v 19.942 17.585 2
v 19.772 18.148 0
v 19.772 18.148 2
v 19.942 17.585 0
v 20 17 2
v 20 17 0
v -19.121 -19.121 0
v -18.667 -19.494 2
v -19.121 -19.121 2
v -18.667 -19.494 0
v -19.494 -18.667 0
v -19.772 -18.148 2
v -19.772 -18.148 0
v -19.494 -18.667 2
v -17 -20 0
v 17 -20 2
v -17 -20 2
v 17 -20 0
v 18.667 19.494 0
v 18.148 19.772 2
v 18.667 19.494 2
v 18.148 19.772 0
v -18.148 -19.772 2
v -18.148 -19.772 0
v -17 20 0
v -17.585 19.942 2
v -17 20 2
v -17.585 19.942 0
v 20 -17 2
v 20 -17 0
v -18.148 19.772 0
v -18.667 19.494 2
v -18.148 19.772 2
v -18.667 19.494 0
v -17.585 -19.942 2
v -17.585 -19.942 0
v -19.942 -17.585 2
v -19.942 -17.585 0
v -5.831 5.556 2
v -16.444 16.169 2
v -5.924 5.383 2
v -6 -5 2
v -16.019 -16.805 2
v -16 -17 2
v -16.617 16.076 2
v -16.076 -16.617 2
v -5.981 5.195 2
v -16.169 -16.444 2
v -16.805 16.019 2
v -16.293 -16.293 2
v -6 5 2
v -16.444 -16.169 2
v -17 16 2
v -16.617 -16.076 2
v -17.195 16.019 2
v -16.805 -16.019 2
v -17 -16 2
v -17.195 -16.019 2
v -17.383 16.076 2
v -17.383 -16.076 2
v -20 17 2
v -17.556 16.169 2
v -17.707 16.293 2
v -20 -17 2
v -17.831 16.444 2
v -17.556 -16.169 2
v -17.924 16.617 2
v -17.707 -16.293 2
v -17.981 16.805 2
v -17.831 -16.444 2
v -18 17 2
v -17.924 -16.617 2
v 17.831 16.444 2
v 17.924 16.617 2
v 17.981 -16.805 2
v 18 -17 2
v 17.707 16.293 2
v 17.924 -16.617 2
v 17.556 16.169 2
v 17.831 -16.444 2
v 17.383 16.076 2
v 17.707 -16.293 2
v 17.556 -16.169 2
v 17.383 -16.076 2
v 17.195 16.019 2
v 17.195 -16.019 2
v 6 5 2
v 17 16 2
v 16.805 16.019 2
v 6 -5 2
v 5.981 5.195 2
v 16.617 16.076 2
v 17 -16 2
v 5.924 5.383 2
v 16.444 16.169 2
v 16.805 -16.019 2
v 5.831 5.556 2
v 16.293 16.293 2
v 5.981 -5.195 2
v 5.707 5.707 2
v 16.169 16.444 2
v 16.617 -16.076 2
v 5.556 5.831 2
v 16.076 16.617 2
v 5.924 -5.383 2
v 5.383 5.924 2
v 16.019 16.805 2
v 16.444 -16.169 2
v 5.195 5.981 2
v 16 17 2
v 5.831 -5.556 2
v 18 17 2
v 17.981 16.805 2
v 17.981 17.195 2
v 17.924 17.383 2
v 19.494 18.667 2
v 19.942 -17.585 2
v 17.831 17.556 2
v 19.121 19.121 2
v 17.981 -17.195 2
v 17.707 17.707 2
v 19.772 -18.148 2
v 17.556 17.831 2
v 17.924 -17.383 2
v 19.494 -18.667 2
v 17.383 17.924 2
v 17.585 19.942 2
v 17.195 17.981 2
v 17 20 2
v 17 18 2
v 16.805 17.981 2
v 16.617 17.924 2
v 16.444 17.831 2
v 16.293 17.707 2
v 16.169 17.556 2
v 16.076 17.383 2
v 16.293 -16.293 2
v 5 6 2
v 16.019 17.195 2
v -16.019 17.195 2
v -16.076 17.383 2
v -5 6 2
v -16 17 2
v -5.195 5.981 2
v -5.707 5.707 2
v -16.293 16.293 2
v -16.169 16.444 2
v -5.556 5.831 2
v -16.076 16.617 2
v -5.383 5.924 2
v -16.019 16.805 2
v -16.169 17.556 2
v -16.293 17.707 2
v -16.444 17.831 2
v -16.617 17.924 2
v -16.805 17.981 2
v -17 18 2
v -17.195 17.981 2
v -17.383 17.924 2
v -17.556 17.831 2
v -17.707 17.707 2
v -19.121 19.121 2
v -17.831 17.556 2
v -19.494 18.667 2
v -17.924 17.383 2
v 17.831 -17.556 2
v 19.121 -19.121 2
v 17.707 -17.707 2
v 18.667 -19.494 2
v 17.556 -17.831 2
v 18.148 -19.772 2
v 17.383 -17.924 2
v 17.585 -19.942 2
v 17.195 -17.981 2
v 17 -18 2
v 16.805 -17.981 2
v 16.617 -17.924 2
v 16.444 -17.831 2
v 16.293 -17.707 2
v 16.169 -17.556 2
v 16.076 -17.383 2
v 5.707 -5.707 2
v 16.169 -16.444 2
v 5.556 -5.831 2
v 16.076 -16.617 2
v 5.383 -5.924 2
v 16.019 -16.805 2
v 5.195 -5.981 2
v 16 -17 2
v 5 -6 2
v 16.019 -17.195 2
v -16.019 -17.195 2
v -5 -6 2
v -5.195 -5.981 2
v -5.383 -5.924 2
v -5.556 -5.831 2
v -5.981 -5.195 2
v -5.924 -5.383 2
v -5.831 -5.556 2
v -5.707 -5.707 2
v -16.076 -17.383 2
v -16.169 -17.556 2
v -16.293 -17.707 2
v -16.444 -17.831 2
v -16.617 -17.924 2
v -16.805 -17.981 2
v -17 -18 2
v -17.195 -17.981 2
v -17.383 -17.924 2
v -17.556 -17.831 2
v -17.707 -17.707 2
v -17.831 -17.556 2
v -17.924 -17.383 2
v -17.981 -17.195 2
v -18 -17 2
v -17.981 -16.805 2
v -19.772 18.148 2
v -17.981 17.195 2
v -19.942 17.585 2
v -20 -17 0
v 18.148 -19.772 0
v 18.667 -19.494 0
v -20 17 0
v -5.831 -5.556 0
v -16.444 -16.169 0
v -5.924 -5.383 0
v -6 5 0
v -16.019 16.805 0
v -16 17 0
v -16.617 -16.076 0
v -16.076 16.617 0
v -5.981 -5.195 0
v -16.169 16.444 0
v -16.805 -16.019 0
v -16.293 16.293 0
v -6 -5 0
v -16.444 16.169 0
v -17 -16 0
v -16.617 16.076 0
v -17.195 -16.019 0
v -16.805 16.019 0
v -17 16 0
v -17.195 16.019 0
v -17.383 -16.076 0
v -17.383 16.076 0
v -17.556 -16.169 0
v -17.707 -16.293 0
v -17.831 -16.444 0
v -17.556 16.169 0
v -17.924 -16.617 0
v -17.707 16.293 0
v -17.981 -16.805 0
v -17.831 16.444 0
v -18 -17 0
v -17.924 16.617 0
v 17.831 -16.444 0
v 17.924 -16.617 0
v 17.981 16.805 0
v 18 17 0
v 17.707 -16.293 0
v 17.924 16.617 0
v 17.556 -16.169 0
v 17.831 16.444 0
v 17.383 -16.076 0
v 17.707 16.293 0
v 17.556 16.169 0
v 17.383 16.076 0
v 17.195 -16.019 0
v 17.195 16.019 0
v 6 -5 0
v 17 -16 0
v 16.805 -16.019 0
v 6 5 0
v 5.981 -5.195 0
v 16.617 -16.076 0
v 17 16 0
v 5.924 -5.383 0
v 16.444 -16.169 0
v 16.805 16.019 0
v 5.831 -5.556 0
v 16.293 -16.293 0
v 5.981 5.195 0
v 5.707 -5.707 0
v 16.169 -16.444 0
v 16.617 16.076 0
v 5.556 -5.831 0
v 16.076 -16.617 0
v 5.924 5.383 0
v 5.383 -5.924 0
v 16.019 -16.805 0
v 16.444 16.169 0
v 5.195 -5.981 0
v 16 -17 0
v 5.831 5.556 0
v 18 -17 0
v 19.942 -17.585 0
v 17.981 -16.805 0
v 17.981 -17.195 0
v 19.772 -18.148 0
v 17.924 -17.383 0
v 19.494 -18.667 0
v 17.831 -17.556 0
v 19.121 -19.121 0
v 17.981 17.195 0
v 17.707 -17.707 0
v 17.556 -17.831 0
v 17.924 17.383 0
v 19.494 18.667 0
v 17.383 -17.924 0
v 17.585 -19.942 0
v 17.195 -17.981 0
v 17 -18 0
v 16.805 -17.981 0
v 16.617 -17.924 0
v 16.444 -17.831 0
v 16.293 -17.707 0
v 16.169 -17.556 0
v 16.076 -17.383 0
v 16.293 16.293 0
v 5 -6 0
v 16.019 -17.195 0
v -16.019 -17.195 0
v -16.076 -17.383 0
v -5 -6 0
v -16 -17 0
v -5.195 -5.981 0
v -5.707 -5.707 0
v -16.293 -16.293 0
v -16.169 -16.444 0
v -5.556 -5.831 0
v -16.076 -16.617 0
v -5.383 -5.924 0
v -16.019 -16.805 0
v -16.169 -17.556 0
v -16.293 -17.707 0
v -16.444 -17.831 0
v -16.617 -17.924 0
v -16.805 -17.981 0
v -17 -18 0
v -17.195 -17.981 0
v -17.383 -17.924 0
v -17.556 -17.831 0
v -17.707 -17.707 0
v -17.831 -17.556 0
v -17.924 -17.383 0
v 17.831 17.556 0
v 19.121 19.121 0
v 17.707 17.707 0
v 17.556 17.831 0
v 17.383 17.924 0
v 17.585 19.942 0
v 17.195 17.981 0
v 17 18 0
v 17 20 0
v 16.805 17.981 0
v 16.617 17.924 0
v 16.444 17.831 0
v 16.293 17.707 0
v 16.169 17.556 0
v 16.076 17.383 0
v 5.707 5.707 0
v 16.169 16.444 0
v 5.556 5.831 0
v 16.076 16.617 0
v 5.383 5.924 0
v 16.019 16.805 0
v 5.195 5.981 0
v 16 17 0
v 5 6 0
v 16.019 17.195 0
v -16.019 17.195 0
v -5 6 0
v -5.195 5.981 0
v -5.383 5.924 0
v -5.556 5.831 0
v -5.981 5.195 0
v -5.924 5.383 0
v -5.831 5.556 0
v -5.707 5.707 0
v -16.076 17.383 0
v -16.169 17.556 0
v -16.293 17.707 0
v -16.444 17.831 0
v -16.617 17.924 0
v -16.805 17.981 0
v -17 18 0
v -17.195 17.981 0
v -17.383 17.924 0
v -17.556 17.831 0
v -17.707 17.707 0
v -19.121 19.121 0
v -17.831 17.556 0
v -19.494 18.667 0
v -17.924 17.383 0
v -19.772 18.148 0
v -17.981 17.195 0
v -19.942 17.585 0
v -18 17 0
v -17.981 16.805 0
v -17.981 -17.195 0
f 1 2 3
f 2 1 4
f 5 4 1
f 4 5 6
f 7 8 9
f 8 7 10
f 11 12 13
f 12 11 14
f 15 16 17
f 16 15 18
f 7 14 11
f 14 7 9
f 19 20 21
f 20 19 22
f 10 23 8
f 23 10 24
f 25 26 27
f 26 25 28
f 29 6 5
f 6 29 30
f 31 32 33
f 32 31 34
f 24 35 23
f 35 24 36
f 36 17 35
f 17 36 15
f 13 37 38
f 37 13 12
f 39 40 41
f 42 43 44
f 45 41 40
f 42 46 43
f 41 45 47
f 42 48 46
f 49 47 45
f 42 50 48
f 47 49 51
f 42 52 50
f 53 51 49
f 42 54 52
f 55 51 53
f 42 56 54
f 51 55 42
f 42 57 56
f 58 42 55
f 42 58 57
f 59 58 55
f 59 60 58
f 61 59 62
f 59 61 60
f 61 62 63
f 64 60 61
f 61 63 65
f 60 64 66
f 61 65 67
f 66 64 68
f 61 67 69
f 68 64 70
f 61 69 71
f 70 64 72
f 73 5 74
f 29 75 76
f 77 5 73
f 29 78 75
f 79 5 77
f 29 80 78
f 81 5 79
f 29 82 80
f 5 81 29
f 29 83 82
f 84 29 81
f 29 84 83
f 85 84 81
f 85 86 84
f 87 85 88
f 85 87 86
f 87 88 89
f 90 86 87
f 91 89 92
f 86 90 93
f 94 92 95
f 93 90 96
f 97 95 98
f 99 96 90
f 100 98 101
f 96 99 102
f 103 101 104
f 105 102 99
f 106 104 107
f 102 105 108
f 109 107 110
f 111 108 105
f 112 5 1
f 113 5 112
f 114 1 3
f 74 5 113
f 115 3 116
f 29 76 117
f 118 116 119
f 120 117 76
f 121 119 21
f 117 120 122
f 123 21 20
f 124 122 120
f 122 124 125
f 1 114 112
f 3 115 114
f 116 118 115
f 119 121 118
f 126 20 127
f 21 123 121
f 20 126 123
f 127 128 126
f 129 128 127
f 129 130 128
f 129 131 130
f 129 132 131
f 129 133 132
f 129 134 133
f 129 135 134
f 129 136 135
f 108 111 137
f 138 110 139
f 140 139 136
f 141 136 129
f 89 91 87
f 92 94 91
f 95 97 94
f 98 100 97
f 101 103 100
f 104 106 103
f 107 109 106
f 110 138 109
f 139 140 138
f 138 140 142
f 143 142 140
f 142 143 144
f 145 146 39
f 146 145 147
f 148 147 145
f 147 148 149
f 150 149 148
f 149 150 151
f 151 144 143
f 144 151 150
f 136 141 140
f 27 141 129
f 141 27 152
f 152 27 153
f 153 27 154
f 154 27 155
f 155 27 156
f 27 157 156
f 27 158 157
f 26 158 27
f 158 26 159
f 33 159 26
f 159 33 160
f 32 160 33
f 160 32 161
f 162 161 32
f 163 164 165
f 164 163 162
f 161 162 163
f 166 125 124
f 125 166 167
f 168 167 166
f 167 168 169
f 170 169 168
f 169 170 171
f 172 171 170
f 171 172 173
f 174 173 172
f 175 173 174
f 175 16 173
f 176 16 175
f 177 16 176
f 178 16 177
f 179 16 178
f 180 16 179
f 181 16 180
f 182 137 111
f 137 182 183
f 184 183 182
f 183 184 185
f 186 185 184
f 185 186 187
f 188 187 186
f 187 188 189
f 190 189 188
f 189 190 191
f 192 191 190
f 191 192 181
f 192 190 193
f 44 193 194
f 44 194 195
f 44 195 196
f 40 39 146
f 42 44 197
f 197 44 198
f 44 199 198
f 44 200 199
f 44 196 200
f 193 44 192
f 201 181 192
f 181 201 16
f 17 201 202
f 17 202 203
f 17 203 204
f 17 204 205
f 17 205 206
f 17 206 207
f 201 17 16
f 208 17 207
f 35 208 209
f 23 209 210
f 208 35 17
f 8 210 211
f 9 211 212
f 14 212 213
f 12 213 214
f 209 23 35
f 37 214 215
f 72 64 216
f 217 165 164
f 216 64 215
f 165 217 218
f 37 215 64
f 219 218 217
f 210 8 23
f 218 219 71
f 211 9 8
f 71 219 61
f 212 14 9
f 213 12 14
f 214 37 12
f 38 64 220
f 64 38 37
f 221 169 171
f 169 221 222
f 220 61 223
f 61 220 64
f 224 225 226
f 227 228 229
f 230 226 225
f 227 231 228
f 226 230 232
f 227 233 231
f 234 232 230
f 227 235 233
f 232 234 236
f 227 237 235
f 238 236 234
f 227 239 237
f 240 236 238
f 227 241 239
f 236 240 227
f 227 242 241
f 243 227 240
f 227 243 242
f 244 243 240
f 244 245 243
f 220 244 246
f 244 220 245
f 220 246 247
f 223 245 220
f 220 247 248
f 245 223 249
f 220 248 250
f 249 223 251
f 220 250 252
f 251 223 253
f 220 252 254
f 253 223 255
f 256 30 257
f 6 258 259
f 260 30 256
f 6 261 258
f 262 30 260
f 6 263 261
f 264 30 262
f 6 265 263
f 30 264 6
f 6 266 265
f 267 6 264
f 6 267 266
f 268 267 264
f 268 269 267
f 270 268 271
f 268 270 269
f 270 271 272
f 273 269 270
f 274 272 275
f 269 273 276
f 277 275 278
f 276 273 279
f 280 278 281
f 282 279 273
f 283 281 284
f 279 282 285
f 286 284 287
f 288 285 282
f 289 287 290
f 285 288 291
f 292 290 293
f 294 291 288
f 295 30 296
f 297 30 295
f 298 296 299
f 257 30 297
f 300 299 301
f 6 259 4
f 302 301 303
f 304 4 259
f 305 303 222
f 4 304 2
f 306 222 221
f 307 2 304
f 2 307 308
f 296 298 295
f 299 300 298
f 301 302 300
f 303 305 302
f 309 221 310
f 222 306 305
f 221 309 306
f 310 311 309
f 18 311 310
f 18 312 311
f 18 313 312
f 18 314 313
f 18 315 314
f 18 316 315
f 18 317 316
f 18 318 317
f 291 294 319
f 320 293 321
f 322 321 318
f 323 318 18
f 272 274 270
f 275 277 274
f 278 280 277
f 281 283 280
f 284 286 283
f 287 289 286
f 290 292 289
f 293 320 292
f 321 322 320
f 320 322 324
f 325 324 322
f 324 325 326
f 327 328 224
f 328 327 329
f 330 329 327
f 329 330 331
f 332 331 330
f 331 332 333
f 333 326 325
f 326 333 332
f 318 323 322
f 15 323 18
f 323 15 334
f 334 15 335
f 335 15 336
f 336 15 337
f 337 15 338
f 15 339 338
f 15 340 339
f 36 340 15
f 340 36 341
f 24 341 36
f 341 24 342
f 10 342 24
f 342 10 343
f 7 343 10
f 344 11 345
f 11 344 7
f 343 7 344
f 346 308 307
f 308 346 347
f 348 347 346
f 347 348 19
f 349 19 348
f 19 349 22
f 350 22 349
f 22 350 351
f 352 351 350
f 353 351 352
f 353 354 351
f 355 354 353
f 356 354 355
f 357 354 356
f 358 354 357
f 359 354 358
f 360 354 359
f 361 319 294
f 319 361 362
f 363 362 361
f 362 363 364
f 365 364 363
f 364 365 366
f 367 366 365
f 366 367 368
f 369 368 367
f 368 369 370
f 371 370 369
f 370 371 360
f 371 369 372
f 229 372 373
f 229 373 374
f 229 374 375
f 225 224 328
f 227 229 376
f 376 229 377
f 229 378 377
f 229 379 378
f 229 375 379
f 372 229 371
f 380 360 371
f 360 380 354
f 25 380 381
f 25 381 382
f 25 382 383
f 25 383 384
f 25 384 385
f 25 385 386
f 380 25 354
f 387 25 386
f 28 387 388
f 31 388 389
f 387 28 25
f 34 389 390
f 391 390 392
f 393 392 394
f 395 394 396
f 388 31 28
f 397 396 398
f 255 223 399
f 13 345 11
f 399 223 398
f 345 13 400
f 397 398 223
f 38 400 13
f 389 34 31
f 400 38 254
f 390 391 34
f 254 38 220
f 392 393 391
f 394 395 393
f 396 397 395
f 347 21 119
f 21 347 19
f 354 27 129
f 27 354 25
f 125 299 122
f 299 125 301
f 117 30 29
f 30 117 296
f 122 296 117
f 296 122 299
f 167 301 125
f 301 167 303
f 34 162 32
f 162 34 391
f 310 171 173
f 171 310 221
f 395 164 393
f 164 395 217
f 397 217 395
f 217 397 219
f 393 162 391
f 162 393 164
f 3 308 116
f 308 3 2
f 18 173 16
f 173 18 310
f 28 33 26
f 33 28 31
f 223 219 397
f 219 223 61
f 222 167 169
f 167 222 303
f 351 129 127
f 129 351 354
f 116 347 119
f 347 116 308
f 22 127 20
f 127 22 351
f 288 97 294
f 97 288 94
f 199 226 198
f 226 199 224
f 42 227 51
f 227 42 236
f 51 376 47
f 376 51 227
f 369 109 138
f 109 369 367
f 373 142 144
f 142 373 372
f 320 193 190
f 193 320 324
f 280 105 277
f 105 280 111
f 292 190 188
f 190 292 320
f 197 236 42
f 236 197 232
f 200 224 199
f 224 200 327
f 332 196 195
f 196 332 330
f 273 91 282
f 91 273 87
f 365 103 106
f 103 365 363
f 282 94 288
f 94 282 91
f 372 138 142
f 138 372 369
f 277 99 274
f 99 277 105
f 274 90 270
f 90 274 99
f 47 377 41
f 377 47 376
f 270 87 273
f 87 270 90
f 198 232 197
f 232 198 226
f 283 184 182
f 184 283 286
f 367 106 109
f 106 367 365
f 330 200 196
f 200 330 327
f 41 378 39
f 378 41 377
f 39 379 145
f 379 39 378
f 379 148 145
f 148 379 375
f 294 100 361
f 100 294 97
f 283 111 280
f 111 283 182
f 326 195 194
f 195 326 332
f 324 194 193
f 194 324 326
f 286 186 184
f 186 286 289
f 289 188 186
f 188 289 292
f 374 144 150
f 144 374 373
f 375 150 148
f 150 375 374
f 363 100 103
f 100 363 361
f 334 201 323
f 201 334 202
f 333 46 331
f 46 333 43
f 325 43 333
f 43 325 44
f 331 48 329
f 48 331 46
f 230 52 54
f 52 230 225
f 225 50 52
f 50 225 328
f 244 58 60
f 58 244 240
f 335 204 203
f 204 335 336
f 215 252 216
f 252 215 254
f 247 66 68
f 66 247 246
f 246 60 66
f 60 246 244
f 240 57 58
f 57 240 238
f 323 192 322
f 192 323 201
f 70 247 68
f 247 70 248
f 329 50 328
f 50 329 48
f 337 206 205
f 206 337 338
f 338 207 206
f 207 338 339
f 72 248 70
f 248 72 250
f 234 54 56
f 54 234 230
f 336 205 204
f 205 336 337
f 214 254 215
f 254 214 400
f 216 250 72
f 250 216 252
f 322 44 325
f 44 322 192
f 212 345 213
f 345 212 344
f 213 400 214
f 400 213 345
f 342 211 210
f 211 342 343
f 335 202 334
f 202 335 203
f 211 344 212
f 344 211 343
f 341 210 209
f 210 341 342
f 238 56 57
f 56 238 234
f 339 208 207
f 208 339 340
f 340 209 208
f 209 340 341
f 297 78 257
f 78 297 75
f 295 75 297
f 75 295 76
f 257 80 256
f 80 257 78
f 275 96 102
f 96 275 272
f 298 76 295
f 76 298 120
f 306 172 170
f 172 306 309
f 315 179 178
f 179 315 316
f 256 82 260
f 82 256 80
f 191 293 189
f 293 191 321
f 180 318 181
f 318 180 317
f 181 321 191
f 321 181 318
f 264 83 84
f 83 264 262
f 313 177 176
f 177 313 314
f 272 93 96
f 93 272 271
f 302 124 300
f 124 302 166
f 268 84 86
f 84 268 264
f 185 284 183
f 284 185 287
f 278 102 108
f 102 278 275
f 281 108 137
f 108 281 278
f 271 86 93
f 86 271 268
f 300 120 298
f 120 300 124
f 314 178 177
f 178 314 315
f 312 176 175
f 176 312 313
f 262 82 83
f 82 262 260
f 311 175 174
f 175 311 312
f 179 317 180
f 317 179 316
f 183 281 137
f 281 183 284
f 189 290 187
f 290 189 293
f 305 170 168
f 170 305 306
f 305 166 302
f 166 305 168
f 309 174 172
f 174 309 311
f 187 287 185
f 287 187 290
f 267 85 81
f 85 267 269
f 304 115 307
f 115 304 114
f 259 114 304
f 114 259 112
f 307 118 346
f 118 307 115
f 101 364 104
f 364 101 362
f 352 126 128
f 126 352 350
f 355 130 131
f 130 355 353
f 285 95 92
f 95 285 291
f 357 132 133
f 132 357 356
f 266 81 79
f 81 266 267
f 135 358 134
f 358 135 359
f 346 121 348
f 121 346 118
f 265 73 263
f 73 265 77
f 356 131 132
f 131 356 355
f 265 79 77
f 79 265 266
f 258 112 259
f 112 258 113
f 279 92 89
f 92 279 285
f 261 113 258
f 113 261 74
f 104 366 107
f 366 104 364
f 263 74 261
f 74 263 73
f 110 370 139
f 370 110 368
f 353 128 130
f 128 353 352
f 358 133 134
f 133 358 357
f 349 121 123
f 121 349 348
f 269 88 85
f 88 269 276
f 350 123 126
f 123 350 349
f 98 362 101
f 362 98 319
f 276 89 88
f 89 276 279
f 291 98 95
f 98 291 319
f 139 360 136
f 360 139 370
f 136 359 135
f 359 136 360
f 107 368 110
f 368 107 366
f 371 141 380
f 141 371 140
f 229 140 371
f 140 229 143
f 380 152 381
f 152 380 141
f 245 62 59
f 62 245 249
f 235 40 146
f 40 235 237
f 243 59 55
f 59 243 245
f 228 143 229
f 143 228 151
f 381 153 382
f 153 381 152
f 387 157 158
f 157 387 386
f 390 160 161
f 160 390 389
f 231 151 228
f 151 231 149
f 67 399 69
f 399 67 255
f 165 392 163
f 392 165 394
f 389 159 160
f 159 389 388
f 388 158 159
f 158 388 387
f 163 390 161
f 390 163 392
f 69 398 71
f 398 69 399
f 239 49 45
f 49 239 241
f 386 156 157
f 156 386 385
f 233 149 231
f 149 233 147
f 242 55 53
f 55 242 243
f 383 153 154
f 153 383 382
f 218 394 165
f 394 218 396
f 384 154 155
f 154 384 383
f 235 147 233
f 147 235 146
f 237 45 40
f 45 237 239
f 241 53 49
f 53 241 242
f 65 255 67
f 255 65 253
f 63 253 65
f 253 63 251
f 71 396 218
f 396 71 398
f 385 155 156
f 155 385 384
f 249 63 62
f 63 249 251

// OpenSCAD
$fn=32;


difference(){
linear_extrude(2)
minkowski(){
circle(r=3);
square([34, 34], center=true);
}

linear_extrude(4)
minkowski(){
circle(r=1);
square([10, 10], center=true);
}

translate([-17,-17, -1])
cylinder(d=2, h=10);

translate([17,-17, -1])
cylinder(d=2, h=10);

translate([17,17, -1])
cylinder(d=2, h=10);

translate([-17,17, -1])
cylinder(d=2, h=10);
}
